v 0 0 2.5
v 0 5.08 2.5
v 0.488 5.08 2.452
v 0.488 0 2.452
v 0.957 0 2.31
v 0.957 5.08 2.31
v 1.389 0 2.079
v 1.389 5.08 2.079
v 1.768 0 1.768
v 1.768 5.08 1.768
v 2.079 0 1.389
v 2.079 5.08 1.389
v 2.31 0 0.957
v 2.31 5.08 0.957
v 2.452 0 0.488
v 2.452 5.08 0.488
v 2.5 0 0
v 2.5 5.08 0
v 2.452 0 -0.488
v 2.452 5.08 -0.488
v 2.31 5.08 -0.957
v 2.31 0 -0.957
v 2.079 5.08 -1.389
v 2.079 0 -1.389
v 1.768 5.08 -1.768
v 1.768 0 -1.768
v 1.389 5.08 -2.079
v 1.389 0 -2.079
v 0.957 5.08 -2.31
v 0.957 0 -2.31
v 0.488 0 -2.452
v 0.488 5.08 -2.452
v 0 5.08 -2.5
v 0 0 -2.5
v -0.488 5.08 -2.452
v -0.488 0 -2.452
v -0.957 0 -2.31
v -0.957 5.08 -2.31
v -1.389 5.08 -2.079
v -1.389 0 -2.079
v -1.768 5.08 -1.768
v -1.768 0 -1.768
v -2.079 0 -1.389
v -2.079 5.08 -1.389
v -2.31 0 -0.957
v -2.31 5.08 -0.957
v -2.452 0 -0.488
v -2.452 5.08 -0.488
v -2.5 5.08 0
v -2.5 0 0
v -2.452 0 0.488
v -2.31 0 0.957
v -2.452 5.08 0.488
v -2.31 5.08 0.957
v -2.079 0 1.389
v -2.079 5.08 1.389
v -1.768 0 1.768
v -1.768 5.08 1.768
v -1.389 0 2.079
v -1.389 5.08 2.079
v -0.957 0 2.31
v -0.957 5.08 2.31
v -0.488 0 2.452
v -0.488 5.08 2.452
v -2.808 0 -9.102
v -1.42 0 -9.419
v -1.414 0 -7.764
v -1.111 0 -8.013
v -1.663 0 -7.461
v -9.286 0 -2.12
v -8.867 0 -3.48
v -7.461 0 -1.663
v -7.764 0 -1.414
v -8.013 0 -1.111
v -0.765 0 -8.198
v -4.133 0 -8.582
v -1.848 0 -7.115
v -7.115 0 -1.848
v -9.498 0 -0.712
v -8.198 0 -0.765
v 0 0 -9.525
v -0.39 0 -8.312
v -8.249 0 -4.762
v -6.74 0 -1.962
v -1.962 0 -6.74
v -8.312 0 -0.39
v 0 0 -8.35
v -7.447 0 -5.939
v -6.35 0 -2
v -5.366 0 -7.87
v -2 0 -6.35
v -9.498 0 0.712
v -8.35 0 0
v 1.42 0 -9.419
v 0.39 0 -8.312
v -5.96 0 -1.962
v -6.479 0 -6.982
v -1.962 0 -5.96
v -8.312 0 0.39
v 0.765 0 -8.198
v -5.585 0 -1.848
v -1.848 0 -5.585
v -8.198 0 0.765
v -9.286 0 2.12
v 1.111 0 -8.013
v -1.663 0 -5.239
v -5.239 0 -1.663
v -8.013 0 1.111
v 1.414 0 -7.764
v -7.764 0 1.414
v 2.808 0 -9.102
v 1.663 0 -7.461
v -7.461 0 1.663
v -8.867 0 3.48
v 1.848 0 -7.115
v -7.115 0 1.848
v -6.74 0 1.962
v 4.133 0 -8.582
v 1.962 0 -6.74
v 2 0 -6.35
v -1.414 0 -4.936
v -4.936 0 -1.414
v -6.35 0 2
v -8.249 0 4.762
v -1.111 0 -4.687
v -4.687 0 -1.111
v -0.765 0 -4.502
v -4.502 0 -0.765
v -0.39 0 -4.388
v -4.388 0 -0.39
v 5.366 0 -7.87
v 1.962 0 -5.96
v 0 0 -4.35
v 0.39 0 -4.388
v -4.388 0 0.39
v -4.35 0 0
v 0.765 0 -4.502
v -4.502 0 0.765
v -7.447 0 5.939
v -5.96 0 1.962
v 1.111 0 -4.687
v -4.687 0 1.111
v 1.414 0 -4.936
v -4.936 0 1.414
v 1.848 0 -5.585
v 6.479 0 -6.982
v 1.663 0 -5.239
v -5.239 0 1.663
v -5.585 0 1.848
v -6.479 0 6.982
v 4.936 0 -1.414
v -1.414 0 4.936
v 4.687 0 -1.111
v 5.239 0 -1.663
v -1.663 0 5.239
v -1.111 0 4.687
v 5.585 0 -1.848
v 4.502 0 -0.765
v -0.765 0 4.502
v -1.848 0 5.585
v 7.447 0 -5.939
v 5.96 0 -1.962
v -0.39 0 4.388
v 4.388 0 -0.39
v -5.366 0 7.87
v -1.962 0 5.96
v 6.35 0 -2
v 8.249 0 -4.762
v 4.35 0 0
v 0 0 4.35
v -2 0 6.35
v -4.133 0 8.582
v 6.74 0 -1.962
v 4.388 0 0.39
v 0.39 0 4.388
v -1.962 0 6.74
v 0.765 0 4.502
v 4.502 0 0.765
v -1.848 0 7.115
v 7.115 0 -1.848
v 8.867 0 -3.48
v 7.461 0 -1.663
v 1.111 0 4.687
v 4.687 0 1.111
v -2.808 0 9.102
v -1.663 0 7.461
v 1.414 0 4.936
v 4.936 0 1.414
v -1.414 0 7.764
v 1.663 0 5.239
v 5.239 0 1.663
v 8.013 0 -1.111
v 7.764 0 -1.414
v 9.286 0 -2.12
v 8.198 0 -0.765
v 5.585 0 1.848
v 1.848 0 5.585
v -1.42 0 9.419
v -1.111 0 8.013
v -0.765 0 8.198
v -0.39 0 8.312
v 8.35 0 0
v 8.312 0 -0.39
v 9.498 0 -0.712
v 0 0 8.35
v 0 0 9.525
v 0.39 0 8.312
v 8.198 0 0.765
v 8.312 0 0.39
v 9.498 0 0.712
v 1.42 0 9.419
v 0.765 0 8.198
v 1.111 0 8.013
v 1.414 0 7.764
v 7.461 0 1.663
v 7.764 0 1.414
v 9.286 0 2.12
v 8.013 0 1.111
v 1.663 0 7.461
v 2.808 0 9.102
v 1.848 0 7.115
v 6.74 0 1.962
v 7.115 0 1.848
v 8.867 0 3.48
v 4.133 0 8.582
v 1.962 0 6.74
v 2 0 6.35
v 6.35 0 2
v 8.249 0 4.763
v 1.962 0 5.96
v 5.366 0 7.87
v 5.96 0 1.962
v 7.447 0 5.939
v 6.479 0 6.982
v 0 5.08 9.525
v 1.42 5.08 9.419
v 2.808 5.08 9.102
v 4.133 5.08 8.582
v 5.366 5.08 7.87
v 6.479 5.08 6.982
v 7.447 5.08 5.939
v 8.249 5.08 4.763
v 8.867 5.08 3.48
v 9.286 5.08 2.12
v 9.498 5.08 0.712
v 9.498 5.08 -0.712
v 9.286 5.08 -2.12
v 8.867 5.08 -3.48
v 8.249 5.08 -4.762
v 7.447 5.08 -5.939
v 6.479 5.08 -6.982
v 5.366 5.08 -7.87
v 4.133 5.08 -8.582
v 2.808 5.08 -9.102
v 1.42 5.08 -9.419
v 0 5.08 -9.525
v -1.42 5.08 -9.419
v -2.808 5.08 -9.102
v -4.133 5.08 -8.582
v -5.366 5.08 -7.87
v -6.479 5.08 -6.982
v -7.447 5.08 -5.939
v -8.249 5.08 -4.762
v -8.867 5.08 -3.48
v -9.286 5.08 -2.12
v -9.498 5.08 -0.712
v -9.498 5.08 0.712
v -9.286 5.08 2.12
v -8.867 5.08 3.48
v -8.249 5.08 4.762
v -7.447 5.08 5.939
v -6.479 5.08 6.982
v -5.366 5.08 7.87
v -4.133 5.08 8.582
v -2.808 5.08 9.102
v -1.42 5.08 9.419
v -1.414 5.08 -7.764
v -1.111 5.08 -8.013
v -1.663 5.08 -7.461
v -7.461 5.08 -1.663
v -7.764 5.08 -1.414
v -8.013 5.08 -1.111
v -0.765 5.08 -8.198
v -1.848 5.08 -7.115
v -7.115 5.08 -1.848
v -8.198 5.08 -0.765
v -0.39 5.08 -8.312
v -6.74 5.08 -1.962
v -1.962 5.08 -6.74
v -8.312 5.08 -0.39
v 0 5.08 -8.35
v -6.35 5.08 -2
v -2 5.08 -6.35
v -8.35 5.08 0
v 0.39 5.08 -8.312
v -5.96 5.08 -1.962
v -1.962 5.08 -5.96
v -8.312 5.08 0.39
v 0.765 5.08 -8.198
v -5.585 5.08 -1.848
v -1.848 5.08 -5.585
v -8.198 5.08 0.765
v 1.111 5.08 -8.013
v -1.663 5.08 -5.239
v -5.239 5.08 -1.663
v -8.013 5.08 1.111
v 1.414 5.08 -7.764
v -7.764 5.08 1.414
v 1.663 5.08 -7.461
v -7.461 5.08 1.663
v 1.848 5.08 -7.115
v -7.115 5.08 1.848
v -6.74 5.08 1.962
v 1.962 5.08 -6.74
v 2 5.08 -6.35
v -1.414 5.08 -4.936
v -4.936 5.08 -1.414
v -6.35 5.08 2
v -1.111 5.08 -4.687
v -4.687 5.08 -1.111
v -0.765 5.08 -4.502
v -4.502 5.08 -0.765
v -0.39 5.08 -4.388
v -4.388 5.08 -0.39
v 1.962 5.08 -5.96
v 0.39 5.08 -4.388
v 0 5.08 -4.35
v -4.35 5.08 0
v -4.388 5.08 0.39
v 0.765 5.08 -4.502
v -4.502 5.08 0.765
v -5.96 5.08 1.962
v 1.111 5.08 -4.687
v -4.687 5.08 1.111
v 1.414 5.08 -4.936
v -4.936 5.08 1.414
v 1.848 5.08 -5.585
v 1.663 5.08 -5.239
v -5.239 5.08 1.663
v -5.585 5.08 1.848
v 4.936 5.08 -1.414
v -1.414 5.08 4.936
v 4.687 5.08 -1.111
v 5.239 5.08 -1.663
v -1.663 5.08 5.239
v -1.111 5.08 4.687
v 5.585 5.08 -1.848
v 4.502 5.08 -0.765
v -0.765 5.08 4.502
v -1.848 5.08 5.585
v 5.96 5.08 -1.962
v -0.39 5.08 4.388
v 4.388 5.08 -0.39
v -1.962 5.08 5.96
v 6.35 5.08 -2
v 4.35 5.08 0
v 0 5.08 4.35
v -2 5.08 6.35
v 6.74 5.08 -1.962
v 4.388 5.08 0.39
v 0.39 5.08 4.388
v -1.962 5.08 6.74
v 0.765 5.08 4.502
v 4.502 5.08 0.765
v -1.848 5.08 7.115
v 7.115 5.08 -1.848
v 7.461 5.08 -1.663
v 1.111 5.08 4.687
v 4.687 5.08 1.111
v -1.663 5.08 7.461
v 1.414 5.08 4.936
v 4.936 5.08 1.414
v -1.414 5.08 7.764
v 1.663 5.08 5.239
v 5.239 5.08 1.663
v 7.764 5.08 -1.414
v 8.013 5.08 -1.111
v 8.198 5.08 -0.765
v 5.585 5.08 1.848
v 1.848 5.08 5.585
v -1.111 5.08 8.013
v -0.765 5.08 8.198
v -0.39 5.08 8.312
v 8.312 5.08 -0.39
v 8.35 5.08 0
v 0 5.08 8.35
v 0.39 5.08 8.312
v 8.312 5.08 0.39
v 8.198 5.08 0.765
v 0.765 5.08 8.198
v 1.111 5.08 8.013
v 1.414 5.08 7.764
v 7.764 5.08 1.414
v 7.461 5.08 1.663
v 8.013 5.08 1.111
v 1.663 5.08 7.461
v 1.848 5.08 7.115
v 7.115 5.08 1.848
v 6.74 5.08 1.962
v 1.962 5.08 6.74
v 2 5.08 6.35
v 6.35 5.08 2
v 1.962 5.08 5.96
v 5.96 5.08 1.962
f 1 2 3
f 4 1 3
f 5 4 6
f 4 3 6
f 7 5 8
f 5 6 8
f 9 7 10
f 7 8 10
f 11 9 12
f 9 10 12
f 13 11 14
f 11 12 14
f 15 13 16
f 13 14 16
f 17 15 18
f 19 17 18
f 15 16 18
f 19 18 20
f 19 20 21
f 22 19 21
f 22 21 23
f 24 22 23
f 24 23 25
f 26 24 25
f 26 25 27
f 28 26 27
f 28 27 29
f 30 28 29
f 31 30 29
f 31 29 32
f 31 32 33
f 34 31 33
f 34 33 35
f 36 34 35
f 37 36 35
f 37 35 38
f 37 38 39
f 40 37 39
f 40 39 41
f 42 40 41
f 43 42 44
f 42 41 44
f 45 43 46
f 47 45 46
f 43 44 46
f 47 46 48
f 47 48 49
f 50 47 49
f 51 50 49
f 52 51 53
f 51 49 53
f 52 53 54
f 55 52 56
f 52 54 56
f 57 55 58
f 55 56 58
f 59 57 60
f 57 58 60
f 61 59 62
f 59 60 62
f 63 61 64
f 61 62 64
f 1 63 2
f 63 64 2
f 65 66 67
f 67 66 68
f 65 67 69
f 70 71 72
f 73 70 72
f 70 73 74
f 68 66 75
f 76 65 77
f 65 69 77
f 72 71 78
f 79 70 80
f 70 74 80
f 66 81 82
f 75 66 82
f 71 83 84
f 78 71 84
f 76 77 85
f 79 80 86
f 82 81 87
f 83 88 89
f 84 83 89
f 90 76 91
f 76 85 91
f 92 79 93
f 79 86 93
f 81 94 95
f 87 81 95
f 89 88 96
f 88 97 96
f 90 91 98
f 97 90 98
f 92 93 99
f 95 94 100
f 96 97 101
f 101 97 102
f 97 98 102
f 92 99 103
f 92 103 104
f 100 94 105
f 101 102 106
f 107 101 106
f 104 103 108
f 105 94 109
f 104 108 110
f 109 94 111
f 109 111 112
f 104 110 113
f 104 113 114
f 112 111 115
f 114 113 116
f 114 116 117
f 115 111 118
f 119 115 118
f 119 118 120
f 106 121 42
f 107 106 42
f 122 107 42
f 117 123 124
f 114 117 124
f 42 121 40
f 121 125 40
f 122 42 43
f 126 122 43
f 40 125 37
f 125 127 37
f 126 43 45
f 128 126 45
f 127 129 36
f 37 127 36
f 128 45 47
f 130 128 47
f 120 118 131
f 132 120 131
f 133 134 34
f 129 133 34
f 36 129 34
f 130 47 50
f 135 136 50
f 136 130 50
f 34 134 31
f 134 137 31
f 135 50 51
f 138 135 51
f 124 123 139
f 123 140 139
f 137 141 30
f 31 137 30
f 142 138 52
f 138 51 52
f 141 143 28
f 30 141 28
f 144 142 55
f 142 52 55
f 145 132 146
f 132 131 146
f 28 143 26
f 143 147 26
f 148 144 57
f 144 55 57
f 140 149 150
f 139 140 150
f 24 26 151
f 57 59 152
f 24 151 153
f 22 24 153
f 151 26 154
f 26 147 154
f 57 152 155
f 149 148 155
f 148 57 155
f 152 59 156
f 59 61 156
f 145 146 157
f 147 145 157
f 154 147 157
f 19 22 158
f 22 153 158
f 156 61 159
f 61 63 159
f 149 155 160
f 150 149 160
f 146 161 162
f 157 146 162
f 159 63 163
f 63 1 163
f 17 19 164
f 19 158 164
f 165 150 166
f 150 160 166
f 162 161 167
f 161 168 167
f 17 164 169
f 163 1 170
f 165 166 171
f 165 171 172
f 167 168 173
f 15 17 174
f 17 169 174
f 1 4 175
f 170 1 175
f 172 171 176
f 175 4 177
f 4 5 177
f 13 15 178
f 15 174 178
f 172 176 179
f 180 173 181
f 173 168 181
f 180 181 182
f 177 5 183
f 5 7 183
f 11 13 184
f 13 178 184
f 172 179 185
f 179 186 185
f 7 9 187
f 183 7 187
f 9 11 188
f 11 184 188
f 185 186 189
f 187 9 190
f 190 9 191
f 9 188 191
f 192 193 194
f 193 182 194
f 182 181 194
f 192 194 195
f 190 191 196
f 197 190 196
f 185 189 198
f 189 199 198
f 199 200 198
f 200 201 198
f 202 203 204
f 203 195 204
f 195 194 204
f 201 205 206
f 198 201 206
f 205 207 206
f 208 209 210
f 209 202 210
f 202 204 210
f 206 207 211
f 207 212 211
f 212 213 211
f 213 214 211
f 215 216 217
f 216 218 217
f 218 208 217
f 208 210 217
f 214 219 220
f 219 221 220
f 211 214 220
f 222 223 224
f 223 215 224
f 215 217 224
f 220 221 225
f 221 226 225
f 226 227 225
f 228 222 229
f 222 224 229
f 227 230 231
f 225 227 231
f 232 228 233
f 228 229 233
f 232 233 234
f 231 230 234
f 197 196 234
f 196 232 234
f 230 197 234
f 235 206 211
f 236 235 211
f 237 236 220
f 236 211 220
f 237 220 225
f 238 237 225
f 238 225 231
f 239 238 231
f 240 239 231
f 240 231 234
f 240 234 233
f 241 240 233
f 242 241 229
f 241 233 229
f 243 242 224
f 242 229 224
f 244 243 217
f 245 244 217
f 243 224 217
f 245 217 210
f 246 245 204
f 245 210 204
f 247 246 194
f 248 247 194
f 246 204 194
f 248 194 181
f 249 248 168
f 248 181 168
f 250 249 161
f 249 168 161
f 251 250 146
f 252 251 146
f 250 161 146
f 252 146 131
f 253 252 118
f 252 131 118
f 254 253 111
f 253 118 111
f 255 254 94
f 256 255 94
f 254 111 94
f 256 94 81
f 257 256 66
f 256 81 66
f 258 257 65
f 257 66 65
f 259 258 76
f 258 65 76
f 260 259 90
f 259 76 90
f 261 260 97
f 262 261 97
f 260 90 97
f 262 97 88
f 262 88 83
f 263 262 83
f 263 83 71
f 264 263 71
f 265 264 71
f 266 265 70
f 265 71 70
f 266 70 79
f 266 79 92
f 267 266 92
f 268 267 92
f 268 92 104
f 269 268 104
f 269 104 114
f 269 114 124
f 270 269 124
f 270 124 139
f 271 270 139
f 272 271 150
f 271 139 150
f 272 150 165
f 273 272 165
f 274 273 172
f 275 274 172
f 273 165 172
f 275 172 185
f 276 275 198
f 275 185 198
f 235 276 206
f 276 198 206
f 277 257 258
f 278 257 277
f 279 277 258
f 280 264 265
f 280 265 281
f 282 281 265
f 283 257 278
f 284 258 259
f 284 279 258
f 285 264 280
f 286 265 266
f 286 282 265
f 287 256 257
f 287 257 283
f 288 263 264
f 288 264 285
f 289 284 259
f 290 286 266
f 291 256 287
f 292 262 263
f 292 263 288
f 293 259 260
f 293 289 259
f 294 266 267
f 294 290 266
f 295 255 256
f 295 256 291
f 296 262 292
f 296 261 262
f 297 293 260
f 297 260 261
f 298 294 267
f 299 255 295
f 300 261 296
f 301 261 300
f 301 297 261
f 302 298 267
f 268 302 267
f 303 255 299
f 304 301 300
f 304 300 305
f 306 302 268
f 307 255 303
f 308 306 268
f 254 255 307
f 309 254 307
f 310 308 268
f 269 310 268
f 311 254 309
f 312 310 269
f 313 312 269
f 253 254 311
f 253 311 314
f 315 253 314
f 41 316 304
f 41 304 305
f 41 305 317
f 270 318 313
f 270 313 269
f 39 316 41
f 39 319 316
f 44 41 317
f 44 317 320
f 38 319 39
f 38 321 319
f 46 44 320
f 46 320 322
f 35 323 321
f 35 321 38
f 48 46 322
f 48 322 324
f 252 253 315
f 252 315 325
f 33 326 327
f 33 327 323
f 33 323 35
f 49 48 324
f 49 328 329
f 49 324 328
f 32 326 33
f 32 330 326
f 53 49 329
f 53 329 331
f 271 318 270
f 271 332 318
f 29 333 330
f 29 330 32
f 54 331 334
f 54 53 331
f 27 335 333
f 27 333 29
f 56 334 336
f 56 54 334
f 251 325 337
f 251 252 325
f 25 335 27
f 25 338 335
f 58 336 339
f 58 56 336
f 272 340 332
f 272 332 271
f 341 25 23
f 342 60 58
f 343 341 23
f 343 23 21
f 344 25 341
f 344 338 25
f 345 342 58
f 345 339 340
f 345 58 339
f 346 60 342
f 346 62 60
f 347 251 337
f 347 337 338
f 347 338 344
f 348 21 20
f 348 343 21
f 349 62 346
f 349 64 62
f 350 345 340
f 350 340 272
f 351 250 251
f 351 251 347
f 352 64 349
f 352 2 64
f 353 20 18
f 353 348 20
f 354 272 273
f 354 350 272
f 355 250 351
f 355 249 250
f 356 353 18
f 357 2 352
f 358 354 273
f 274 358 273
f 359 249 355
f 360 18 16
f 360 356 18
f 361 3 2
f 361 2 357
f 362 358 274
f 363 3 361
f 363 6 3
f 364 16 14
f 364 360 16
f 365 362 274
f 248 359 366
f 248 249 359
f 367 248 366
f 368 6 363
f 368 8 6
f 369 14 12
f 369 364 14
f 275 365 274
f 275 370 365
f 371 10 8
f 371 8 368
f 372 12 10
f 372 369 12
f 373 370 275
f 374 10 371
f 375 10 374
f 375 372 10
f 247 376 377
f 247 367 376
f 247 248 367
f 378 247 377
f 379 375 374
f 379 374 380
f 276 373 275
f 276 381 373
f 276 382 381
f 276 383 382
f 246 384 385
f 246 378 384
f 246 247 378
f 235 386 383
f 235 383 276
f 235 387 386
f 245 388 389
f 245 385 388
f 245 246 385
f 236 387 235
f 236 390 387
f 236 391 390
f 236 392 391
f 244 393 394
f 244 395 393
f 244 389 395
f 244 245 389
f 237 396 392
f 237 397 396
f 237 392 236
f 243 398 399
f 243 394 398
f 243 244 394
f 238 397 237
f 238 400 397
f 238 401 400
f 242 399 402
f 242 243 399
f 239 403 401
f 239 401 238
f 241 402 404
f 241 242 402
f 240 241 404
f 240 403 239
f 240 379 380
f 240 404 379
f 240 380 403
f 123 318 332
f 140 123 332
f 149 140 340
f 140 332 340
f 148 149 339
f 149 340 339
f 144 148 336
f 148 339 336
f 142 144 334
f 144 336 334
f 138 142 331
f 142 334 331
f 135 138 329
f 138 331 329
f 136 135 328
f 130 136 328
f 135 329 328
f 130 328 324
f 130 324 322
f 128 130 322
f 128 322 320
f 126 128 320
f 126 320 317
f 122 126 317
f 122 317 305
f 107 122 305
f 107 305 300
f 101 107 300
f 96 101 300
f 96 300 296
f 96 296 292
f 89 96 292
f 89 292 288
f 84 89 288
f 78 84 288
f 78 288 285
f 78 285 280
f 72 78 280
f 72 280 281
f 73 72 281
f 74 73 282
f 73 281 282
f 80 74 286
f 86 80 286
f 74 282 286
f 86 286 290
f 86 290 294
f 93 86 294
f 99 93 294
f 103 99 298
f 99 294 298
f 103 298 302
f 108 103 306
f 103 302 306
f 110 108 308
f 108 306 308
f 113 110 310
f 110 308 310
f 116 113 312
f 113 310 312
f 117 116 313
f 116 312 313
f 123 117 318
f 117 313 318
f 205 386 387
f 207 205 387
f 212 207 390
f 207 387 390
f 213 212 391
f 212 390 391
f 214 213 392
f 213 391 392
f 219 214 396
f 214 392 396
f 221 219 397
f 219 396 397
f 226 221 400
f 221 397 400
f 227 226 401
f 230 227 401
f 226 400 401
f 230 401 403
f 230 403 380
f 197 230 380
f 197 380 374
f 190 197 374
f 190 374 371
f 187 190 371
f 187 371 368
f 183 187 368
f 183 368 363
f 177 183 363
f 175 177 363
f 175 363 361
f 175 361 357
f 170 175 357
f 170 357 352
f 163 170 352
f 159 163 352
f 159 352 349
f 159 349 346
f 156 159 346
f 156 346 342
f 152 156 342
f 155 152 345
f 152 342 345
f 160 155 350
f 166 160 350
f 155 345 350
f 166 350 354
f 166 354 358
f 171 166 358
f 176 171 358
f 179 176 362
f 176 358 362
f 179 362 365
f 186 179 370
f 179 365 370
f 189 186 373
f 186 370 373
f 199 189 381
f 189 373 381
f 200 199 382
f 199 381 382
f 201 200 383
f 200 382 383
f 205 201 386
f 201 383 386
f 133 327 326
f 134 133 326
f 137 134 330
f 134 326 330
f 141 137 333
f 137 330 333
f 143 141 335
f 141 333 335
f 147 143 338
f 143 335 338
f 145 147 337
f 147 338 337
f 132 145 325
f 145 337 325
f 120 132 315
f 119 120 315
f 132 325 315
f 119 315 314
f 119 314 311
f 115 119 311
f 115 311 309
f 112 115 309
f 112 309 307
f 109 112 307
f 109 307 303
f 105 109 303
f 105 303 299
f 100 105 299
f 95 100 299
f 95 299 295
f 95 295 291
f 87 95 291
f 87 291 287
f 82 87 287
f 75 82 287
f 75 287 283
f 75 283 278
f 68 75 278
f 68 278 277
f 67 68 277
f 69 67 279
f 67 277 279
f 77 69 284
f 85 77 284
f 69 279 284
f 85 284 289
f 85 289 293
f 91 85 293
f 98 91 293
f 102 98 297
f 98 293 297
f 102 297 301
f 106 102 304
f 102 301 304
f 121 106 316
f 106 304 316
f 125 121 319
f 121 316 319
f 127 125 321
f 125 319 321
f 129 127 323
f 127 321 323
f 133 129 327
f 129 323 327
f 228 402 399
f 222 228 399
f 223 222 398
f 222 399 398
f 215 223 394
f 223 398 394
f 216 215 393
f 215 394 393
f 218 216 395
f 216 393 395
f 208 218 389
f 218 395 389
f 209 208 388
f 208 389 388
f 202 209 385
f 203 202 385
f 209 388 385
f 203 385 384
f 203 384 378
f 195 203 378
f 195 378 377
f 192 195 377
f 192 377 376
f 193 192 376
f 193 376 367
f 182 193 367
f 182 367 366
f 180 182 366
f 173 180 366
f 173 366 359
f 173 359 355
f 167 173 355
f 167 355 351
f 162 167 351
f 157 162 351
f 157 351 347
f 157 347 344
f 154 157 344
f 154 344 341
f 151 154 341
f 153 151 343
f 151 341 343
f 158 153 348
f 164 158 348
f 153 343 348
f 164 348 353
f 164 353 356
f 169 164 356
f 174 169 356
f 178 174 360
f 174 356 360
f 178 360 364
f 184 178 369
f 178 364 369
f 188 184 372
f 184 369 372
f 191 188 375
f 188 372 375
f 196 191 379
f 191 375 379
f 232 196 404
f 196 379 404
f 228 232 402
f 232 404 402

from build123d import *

# Parameters (mm, degrees)
ESQUISSE1_R             = 9.525
BOSS_EXTRU_1_DEPTH      = 5.08
ESQUISSE2_R             = 2
ESQUISSE2_R_2           = 2.5
ENL_V_MAT_EXTRU_1_DEPTH = 15.396445742


with BuildPart() as part:
    # Esquisse1 → Boss.-Extru.1 (new body)
    with BuildSketch(Plane(origin=(0, 0, 0), x_dir=(1, 0, 0), z_dir=(0, 1, 0))):
        with Locations(Location((0, 0, 0), (0, 0, 270))):
            Circle(ESQUISSE1_R)
    extrude(amount=BOSS_EXTRU_1_DEPTH)

    # Esquisse2 → Enlèv. mat.-Extru.1 (cut, through all)
    with BuildSketch(Plane(origin=(0, 5.08, 0), x_dir=(1, 0, 0), z_dir=(0, 1, 0))):
        with Locations(Location((0, 6.35, 0), (0, 0, 270))):
            Circle(ESQUISSE2_R)
        with Locations(Location((-6.35, 0, 0), (0, 0, 270))):
            Circle(ESQUISSE2_R)
        with Locations(Location((6.35, 0, 0), (0, 0, 270))):
            Circle(ESQUISSE2_R)
        with Locations(Location((0, -6.35, 0), (0, 0, 270))):
            Circle(ESQUISSE2_R)
        with Locations(Location((0, 0, 0), (0, 0, 270))):
            Circle(ESQUISSE2_R_2)
    extrude(amount=-ENL_V_MAT_EXTRU_1_DEPTH, mode=Mode.SUBTRACT)


solid = part.part
